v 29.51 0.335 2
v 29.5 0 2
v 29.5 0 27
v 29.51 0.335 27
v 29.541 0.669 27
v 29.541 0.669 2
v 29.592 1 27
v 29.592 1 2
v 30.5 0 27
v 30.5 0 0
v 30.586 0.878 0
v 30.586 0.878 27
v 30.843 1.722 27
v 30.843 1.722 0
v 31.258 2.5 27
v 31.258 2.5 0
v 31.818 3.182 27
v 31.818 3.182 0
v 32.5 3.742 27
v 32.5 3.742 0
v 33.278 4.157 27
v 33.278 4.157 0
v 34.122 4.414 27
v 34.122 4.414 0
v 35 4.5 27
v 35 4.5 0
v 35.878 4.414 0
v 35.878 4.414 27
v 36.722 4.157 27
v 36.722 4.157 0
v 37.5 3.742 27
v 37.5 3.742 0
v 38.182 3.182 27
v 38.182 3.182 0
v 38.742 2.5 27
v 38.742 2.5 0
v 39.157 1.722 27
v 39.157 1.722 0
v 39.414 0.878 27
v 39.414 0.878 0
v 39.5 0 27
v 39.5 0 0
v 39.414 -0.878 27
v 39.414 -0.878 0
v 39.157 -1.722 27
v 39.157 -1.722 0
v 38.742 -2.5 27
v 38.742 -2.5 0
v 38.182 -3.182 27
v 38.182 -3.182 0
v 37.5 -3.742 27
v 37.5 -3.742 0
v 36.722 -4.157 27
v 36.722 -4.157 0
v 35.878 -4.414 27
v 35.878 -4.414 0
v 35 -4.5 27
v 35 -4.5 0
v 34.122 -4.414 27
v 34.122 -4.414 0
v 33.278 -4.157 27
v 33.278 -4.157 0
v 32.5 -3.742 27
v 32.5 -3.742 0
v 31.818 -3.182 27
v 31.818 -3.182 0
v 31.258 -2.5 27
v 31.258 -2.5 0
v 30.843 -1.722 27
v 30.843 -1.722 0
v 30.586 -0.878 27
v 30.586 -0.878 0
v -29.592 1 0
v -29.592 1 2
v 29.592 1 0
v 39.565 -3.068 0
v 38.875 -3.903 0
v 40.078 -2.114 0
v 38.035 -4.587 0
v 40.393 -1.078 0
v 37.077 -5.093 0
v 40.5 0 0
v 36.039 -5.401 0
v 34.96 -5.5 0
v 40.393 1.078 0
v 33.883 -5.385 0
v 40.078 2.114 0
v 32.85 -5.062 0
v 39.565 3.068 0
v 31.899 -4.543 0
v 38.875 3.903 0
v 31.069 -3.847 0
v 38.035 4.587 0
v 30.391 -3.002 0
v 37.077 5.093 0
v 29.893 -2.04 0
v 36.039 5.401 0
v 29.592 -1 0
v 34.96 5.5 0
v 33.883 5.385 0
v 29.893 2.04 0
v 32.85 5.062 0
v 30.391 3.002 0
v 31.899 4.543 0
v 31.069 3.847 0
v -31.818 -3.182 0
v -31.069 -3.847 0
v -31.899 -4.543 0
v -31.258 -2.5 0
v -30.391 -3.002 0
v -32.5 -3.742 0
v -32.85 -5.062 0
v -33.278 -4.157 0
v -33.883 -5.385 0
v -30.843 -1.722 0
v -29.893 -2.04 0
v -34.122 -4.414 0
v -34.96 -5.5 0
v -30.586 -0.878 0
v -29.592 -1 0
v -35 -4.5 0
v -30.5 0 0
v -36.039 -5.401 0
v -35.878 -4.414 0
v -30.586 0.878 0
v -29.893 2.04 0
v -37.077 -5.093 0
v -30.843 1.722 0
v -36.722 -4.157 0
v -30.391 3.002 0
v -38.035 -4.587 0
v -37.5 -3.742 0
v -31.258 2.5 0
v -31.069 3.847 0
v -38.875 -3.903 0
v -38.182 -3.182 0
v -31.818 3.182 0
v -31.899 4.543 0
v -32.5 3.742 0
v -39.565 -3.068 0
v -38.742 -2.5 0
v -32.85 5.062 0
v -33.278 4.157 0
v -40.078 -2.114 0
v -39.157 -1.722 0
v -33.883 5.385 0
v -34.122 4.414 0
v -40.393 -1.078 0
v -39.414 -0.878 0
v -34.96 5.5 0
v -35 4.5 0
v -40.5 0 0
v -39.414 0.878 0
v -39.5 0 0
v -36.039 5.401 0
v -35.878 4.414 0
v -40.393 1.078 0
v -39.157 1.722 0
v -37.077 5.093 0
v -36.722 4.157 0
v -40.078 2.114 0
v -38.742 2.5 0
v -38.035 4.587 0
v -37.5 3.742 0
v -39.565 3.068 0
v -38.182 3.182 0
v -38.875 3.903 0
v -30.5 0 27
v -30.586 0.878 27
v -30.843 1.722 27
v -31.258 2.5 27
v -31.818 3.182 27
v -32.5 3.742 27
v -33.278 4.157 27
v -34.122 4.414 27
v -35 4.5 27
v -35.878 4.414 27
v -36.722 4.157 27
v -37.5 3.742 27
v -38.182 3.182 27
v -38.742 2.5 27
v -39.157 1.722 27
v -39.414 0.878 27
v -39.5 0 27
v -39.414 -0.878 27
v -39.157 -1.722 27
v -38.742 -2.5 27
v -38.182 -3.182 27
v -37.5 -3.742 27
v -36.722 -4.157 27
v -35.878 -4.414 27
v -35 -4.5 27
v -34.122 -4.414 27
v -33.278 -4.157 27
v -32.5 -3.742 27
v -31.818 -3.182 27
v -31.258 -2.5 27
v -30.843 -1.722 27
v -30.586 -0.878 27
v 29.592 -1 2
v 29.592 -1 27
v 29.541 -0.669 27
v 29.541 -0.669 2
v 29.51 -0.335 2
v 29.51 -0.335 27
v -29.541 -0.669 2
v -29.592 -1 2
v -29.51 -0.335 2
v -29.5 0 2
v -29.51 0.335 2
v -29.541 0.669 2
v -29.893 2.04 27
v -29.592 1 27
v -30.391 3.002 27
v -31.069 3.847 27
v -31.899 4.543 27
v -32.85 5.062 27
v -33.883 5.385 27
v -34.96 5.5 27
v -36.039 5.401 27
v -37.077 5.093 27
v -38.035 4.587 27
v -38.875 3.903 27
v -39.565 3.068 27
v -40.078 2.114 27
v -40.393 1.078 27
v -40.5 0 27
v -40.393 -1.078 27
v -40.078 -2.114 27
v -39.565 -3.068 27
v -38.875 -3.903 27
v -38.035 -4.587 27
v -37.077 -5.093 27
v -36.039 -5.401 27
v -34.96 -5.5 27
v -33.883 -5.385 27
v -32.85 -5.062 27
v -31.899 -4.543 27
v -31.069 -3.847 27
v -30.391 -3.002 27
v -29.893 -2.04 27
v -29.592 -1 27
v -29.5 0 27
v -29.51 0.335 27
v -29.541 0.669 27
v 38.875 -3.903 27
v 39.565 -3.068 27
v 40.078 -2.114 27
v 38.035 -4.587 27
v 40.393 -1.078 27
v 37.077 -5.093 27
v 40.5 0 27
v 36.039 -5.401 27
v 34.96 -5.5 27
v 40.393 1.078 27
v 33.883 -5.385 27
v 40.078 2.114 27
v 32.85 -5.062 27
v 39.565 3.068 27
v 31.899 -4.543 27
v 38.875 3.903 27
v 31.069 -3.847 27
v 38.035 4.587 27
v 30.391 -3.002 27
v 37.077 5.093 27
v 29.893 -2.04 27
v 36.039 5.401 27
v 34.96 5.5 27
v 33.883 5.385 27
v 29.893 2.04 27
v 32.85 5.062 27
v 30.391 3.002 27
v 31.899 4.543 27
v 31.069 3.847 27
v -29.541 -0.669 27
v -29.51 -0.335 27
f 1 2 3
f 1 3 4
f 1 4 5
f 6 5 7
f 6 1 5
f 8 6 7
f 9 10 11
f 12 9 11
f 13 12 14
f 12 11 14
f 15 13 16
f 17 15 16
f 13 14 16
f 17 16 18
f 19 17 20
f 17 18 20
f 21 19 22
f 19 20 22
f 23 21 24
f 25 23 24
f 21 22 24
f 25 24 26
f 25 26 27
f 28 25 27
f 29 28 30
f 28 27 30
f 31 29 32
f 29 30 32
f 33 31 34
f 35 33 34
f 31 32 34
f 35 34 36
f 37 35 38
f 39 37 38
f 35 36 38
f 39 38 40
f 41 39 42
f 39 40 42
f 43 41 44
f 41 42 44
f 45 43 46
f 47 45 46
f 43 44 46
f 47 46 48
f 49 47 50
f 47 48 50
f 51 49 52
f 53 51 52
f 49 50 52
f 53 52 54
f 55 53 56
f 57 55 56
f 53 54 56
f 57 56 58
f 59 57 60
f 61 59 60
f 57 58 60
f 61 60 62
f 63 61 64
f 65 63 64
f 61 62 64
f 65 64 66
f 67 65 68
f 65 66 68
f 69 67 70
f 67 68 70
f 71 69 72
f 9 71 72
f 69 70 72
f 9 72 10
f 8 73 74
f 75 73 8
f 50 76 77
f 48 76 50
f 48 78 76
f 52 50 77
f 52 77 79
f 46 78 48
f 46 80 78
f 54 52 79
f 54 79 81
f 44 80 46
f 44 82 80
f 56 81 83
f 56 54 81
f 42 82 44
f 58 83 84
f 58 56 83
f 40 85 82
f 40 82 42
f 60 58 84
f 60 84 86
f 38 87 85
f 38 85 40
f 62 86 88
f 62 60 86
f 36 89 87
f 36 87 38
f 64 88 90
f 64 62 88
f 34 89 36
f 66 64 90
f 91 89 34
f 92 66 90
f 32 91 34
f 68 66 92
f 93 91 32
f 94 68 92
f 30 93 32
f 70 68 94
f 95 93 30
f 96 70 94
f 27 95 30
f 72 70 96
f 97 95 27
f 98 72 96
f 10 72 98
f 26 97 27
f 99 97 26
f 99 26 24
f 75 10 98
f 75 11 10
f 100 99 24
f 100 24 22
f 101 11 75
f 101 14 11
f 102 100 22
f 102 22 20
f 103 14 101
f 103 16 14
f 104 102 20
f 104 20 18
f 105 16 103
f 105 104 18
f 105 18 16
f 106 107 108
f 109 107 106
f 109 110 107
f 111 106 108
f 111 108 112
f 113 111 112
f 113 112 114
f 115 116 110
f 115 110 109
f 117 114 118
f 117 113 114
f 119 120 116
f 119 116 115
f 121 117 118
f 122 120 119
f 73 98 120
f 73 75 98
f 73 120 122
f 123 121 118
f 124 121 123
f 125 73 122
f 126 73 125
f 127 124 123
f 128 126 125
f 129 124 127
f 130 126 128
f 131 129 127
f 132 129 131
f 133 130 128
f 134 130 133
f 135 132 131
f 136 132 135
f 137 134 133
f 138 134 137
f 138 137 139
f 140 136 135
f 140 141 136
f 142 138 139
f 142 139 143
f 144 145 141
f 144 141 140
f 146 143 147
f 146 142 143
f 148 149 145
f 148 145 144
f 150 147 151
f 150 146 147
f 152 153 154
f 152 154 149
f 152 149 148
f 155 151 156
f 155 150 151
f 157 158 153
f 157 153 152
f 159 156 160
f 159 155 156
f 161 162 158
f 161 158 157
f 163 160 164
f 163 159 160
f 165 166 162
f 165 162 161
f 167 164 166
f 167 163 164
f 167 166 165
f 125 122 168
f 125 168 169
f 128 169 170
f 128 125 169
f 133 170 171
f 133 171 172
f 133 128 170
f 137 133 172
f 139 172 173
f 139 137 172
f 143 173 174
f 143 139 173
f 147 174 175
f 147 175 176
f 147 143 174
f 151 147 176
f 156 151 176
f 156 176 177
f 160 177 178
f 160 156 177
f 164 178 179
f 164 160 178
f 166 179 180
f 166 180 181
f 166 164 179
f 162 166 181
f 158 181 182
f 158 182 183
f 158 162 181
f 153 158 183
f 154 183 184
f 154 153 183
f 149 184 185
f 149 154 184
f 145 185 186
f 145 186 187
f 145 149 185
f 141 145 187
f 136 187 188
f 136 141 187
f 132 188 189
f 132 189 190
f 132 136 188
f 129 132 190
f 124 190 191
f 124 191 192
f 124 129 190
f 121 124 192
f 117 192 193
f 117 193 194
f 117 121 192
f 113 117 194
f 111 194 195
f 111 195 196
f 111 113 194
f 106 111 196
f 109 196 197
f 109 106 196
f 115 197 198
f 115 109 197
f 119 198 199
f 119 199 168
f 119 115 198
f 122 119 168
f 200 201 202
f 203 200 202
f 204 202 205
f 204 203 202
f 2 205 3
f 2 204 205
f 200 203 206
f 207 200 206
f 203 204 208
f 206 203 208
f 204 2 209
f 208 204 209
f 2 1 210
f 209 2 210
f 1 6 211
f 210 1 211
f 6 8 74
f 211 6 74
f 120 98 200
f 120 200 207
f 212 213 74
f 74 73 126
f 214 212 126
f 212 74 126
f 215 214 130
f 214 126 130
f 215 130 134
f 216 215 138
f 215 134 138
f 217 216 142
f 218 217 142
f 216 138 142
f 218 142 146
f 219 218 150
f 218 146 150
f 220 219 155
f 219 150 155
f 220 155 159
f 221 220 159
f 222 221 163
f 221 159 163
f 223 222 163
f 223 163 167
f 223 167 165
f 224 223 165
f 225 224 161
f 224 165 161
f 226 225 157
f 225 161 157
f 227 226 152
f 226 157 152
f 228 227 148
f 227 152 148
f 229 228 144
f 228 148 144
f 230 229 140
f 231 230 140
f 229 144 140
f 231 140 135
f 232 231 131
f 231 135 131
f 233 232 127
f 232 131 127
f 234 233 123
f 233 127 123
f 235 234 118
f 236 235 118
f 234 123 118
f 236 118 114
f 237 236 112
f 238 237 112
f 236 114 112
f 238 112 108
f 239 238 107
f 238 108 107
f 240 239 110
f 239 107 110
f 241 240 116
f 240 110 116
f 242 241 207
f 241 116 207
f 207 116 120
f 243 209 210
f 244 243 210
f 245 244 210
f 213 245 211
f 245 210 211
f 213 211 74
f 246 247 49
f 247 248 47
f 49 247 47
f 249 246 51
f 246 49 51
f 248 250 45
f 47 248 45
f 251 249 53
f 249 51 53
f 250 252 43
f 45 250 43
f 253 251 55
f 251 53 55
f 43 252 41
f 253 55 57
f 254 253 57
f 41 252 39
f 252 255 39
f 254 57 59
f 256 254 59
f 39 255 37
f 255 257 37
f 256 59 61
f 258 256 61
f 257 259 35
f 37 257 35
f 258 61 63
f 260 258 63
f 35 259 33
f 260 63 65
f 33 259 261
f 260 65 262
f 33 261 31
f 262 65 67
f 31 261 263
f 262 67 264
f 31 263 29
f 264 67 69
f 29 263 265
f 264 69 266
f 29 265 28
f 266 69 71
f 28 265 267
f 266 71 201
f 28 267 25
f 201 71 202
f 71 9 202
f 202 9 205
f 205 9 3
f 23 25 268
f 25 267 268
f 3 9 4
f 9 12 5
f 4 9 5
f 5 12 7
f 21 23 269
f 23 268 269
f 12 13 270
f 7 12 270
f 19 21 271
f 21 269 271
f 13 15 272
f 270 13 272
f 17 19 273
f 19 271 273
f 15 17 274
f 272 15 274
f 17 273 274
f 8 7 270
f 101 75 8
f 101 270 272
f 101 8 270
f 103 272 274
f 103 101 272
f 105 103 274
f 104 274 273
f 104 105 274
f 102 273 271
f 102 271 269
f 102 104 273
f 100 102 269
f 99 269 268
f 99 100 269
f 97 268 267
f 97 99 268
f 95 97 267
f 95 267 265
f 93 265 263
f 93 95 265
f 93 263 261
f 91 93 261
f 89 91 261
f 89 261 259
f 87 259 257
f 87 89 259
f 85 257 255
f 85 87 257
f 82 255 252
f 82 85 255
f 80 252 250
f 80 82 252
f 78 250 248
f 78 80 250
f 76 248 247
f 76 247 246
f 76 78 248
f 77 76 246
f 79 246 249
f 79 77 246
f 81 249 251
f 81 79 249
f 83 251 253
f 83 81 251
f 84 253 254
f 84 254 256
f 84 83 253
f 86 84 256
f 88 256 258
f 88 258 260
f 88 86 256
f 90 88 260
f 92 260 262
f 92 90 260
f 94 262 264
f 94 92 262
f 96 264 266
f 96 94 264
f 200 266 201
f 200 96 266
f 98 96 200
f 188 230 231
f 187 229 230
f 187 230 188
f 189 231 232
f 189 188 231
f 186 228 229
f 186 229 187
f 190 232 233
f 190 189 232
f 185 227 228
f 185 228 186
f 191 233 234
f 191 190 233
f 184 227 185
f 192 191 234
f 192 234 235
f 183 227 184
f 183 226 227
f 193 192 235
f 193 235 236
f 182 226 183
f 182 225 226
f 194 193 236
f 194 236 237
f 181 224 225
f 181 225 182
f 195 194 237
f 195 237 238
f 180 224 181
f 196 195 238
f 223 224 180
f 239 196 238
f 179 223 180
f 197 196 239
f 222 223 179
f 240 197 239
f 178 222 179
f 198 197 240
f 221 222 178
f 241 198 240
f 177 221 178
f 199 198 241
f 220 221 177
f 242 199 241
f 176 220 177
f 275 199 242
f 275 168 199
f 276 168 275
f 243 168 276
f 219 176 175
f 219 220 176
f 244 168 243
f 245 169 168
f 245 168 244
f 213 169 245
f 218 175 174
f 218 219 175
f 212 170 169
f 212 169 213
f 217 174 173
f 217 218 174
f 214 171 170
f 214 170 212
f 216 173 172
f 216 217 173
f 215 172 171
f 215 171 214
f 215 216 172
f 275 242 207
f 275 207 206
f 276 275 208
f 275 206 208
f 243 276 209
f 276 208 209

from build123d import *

# Parameters (mm, degrees)
F0_R     = 4.5
F1_DEPTH = 27
F2_DEPTH = 2


with BuildPart() as f1:
    # F0 (on Top) → F1 (new body)
    with BuildSketch(Plane.XY):
        with BuildLine():
            ThreePointArc((-29.591673, -1), (-29.522966, -0.502097), (-29.5, 0))
            ThreePointArc((-29.5, 0), (-29.522966, 0.502097), (-29.591673, 1))
            ThreePointArc((-29.591673, 1), (-40.5, 0), (-29.591673, -1))
        make_face()
        with Locations((-35, 0)):
            Circle(F0_R, mode=Mode.SUBTRACT)
    extrude(amount=F1_DEPTH)

    # F0 (on Top) → F2 (join)
    with BuildSketch(Plane.XY):
        with BuildLine():
            ThreePointArc((-29.591673, 1), (-29.522966, 0.502097), (-29.5, 0))
            ThreePointArc((-29.5, 0), (-29.522966, -0.502097), (-29.591673, -1))
            Line((-29.591673, -1), (0, -1))
            Line((0, -1), (0, 1))
            Line((0, 1), (-29.591673, 1))
        make_face()
    extrude(amount=F2_DEPTH)

    # F3: F1 across plane


with BuildPart() as f1_1:
    add(f1.part)
    add(f1.part.mirror(Plane.YZ))


solid = f1_1.part
